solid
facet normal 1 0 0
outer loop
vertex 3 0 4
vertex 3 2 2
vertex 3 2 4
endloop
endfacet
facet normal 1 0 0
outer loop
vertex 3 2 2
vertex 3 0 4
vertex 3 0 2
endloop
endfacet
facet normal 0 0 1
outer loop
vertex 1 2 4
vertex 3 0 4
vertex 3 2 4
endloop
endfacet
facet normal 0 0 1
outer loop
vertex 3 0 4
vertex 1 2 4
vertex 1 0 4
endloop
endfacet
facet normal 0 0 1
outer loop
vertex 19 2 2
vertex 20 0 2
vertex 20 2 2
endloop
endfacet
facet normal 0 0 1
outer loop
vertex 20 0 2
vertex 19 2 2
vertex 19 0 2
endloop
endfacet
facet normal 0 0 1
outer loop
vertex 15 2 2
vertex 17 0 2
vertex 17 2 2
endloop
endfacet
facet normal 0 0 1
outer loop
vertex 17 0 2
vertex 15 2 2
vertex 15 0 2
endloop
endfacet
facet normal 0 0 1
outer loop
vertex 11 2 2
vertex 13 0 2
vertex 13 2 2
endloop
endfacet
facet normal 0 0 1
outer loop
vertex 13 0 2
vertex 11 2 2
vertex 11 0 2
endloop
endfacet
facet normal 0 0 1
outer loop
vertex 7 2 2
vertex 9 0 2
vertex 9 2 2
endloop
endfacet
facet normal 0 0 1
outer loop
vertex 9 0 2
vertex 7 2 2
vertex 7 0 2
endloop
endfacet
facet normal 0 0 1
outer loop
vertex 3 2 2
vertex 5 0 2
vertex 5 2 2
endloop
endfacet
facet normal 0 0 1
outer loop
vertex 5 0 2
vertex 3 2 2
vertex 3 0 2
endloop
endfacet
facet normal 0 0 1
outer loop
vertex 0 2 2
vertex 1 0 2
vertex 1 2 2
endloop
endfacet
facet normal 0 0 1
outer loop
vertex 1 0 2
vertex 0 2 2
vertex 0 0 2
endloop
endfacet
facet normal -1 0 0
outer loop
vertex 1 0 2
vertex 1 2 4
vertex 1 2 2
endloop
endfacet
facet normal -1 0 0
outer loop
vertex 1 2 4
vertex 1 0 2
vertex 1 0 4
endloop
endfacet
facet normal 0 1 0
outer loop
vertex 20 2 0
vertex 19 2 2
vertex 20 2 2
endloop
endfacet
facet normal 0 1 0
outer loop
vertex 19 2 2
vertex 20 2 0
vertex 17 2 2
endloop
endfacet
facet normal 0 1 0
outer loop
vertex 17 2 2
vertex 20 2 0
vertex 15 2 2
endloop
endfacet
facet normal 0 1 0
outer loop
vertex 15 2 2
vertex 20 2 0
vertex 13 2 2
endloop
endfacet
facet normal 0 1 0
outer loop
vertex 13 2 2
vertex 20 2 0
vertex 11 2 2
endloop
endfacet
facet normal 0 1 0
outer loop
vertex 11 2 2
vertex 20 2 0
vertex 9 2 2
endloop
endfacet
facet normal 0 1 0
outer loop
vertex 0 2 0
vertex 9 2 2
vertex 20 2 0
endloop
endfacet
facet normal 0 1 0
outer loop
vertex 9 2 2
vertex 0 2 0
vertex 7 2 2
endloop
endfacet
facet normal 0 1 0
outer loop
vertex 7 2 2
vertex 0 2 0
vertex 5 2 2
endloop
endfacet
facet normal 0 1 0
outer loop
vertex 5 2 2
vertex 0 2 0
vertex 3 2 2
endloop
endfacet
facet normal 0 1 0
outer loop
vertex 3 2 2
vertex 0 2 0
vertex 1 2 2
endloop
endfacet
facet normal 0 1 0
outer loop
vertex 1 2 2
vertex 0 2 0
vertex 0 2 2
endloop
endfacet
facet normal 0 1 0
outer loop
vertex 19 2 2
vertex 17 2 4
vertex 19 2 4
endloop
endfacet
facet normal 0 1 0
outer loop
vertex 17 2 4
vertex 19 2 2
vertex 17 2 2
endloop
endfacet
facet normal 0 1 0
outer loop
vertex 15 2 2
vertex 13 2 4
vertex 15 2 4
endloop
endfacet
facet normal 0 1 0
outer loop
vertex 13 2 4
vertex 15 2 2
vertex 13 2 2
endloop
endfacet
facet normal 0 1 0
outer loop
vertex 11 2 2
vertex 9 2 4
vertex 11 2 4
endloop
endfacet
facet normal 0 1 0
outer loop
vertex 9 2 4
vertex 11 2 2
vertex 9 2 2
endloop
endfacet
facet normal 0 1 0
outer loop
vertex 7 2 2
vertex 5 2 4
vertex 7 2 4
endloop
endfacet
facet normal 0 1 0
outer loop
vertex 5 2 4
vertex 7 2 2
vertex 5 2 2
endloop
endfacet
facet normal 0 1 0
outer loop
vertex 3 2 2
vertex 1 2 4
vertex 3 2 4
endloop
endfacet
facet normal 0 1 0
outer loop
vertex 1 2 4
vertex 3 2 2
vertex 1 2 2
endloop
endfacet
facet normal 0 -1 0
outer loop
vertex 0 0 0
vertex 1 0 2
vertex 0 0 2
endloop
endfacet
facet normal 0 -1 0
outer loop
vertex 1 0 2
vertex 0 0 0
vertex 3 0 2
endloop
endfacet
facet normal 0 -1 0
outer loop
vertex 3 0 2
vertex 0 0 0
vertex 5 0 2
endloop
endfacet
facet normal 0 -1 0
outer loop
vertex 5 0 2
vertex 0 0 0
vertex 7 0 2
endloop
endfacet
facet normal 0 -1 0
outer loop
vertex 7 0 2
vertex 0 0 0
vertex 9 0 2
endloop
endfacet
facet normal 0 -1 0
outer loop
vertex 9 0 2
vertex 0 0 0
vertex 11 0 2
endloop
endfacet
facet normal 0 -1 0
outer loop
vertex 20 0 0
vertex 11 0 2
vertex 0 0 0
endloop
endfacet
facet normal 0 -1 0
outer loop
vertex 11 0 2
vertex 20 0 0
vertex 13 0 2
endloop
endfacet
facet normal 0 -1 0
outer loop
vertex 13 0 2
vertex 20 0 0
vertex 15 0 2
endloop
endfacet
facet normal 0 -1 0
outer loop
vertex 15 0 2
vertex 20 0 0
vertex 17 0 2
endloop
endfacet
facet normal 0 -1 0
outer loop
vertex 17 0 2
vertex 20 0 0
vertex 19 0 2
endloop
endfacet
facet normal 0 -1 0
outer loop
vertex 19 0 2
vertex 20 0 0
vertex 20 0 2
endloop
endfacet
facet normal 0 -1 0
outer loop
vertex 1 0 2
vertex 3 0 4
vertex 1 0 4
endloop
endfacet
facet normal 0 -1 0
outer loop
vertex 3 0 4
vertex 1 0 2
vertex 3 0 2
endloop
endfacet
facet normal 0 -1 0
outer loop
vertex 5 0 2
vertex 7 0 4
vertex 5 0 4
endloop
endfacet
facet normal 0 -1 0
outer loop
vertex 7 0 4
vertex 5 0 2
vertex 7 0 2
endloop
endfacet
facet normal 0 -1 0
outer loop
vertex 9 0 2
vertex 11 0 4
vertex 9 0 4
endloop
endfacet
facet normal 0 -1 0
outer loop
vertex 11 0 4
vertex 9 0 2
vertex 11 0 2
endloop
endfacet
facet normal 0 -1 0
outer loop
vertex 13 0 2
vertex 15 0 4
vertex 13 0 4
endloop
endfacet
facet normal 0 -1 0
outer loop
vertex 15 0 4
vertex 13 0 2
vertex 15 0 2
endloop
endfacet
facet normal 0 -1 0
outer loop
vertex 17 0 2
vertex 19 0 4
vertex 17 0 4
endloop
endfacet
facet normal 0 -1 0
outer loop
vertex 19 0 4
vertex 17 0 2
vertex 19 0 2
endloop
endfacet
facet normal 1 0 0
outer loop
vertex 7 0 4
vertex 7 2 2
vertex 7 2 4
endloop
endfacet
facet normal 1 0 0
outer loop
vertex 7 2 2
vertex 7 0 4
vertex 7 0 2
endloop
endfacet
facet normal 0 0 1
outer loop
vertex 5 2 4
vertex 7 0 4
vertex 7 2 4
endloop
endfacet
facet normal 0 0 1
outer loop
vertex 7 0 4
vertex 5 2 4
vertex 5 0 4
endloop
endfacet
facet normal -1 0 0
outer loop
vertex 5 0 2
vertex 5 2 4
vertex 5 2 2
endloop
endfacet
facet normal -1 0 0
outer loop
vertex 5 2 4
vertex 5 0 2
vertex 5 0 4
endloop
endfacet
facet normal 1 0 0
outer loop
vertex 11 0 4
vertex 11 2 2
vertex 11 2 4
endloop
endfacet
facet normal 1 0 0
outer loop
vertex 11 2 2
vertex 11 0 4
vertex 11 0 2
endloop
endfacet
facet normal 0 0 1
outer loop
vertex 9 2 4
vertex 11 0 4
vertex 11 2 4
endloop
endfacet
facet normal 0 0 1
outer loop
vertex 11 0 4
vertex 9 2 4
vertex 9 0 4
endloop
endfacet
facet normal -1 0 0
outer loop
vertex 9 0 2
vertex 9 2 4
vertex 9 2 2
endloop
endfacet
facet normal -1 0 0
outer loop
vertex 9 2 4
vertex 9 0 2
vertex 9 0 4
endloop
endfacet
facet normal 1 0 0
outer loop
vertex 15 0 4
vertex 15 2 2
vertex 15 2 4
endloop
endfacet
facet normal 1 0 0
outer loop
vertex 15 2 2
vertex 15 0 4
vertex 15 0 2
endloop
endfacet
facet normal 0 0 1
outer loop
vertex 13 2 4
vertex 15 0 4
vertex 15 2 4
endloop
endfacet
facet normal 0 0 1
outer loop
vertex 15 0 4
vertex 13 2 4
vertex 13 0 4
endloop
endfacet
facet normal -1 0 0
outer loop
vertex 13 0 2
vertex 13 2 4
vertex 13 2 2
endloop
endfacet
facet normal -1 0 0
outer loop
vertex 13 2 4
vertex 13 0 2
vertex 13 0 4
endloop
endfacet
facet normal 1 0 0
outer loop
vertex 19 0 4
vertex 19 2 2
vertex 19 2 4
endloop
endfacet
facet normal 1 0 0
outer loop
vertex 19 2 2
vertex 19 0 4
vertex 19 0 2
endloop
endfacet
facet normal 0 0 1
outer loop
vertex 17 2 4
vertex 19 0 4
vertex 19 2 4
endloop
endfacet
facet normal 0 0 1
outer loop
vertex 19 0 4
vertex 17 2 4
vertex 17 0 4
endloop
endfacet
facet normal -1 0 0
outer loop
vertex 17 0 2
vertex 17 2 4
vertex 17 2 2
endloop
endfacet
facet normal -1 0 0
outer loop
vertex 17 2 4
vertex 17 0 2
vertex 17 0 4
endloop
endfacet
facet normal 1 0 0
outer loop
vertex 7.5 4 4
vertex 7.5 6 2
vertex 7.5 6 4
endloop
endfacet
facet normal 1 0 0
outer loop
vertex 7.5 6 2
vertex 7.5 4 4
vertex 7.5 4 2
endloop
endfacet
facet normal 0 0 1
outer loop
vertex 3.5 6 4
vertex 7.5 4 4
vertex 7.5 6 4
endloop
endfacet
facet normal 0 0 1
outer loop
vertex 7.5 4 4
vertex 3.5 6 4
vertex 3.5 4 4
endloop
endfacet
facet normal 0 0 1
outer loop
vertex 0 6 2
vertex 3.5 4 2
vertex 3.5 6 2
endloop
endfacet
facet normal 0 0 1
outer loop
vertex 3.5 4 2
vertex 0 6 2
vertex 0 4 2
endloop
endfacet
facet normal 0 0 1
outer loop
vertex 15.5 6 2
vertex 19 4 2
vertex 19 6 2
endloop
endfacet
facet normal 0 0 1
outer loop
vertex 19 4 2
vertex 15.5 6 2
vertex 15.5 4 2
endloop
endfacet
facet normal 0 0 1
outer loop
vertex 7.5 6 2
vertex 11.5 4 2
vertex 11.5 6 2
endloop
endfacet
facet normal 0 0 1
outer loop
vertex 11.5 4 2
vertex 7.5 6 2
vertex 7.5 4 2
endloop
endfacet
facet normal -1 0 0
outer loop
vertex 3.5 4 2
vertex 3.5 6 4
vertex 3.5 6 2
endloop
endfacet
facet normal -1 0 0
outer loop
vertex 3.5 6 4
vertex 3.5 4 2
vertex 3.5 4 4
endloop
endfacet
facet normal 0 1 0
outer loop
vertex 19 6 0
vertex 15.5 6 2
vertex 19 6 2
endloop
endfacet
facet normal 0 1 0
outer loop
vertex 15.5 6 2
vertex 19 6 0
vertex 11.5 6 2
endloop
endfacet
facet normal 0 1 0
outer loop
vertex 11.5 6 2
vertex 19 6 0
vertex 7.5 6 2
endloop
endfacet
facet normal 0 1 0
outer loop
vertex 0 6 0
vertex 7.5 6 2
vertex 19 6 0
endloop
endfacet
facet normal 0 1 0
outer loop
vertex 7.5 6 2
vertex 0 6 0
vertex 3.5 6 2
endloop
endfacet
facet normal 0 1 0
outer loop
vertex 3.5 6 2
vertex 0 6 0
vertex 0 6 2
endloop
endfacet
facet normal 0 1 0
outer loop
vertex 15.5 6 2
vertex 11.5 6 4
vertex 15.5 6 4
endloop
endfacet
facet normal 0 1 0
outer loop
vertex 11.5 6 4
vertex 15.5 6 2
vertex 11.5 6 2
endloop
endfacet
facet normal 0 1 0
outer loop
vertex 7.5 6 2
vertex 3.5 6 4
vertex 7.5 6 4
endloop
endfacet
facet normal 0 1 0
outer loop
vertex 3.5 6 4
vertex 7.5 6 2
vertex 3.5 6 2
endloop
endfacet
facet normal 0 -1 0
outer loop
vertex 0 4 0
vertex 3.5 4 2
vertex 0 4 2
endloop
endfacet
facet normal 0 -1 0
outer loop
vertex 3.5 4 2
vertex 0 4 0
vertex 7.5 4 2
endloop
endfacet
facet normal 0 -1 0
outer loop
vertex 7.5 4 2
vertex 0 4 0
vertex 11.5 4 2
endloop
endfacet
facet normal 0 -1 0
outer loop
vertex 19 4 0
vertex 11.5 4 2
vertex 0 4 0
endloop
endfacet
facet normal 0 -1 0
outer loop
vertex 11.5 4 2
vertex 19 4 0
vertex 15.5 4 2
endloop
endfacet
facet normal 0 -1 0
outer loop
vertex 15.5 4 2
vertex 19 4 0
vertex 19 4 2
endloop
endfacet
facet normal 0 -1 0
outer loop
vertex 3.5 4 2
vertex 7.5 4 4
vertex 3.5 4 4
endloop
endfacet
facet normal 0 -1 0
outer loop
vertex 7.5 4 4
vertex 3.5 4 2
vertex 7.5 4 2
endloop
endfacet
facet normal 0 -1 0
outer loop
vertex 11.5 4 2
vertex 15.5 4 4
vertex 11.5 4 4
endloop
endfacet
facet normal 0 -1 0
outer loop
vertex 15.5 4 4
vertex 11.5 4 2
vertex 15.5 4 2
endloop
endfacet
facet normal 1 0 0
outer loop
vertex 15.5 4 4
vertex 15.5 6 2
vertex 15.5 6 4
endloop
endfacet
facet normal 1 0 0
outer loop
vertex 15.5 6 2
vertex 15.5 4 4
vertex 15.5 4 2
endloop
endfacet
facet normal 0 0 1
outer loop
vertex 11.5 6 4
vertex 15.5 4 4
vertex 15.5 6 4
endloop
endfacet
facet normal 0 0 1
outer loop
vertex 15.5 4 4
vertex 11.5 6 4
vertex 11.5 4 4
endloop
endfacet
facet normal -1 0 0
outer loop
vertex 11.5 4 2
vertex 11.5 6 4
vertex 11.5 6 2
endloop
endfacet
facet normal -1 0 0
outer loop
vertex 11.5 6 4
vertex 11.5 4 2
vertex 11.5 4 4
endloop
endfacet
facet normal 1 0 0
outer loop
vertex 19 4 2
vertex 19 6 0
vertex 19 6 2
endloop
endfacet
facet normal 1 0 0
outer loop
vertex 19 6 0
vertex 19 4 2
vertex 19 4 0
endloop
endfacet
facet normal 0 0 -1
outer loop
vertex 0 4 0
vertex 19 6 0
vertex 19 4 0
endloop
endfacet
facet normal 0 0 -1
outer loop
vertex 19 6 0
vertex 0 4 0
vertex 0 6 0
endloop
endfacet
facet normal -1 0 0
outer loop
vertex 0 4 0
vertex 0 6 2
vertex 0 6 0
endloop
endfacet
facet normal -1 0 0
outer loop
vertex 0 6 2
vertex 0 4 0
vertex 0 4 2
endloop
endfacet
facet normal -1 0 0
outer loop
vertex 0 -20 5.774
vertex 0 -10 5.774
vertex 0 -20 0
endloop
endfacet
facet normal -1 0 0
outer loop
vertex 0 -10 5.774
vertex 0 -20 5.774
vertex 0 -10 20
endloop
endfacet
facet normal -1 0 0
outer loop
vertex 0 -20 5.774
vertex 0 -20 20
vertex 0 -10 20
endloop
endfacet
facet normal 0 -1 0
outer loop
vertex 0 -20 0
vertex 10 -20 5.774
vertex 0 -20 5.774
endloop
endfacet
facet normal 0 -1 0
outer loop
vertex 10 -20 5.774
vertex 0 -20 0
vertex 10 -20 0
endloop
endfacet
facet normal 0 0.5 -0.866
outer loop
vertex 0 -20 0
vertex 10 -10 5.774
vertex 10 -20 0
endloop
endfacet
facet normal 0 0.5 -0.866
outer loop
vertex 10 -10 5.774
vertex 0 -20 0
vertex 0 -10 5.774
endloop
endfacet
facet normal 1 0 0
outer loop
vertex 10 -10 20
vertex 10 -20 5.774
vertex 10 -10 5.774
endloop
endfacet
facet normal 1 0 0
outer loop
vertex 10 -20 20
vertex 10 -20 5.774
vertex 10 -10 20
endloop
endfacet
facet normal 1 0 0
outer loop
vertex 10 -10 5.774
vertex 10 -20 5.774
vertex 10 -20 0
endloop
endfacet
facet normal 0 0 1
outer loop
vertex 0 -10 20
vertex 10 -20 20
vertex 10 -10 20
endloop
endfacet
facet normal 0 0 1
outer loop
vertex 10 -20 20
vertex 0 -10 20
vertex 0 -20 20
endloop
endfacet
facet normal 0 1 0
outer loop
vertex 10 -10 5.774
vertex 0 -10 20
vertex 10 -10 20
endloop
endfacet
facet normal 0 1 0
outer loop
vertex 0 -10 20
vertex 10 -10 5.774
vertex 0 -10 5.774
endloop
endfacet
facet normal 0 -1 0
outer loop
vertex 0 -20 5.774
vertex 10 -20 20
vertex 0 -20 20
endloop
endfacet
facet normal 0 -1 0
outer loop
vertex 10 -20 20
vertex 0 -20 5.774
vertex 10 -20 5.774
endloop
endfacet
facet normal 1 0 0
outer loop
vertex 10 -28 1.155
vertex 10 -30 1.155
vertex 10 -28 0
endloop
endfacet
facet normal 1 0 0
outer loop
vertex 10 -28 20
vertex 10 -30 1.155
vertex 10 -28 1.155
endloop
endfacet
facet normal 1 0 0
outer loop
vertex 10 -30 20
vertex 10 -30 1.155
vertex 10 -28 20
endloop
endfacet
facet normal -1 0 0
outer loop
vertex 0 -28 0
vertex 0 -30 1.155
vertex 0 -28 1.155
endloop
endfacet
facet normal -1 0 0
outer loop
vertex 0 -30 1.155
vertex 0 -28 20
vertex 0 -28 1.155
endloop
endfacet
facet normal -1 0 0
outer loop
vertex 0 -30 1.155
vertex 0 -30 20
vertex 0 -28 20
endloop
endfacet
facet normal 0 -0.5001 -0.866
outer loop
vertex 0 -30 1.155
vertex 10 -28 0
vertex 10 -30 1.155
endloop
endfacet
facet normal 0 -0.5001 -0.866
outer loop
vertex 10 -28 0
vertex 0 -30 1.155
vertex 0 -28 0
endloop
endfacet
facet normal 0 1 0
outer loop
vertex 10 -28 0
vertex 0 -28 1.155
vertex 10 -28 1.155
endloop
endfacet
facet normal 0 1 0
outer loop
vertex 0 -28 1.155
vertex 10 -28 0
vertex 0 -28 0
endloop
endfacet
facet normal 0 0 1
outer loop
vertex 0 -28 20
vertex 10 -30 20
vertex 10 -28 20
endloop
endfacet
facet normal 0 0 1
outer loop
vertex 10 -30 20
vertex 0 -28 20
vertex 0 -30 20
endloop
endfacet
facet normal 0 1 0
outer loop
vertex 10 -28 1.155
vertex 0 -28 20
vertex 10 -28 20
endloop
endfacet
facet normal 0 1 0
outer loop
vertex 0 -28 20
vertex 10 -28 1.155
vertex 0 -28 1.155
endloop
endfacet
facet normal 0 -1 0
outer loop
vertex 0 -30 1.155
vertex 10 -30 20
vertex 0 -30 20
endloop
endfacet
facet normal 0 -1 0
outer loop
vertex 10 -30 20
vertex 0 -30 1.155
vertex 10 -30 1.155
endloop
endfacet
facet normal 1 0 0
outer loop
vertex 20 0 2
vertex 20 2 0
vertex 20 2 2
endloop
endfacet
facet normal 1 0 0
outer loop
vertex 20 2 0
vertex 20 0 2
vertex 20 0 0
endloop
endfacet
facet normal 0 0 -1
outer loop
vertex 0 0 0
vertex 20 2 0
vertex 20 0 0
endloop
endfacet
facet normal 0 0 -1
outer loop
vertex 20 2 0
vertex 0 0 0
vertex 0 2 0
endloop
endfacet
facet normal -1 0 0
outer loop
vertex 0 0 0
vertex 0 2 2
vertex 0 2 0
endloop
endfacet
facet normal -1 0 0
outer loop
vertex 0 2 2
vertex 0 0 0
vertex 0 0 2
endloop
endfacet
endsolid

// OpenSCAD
// file: utility.scad
/*This library, part of UtilitySCAD, is placed into the public domain by NMR_Scientist.

Version: R1
Title: UtilitySCAD
Description: Miscellaneous utility modules I developed over the course of several projects to reuse common operations that were seen over various models.

History:
* ??/??/2024 - R1 - First release to be with a model whenever it is released.
*/

$fa = 1;
$fs = 0.1;

use <MCAD/regular_shapes.scad>;

//Move objects in the x-axis.
module move_x (x)
{
    translate([x,0,0])
    {
        children();
    }
}

//Move objects in the y-axis
module move_y (y)
{
    translate([0,y,0])
    {
        children();
    }
}

//Move objects in the z-ax
module move_z (z)
{
    translate([0,0,z])
    {
        children();
    }
}

//Move objects by a given point in all direction. -1 would means moving to the left, moving back, and moving down by one point.
module move_by(point)
{
    translate([point,point,point])
    {
        children();
    }
}

//Exactly like move_by, but a negation. Named for its very common use in adding tolerance to objects.
module move_by_margin(m)
{
    move_by(-m)
    {
        children();
    }
}

//A cylinder rotated to its side.
module hor_cylinder(width,r,r)
{
    move_y(r)
        move_z(r)
            rotate([0,90,0])
            {
                cylinder(width,r,r);
            }
}

module hor_cylinder_y(length,r)
{
    translate([r * 2,0,0])
    {
        rotate([0,0,90])
        {
            hor_cylinder(length,r);
        }
    }
}


//Cut a object at a given height and then move that object down, usually to zero if the object was placed at zero height.
module hor_cut(width,length,height)
{
    translate([0,0,-height])
    {
        difference()
        {
            children();
            translate([-1,-1,-1])
            {
                cube([width + 2,length + 2,height + 1]);
            }
        }
    }
}

function bevel_radius(length) = length * 2 / 3;
function bevel_height(r) = r * sqrt(3)/2;

//Bevel at 45 degree slope up, facing back, then extrude upward by height.
module bevel_up_back_45(width,length,height)
{
    r = bevel_radius(length);
    z = bevel_height(r);
    m = 0.1;
    m_2 = m * 2;
    difference()
    {
        translate([0,r / 2,z])
        {
            rotate([0,90,0])
            {
                triangle_prism(width,r);
            }
        }
        // Cut off to the required height.
        move_x(-m)
            move_y(-m)
                move_z(height)
                   cube([width + m,length + m,z * 2 - height]);
    }
    //If cutting off isn't happening simply add height.
    if (height >= z)
    {
        move_z(z)
        {
            cube([width,length,height - z]);
        }
    }
}

module bevel_up_front_45(width,length,height)
{
    r = bevel_radius(length);
    z = bevel_height(r);
    m = 0.1;
    m_2 = m * 2;
    difference()
    {
        translate([width,r,z])
        {
            rotate([0,90,180])
            {
                triangle_prism(width,r);
            }
        }
        // Cut off to the required height.
        move_x(-m)
            move_y(-m)
                move_z(height)
                   cube([width + m,length + m,z * 2 - height]);
    }
    //If cutting off isn't happening simply add height.
    if (height >= z)
    {
        move_z(z)
        {
            cube([width,length,height - z]);
        }
    }
}

module center_z(centering_z,target_z)
{
    z = (target_z - centering_z) / 2;
    translate([0,0,z])
    {
        children();
    }
}

module center_y(centering_y,target_y)
{
    y = (target_y - centering_y) / 2;
    translate([0,y,0])
    {
        children();
    }
}

//Center an object against a particular width of another object.
module center(centering_w,target_w)
{
    x = (target_w - centering_w) / 2;
    translate([x,0,0])
    {
        children();
    }
}

//Move object to a certain value of x, but also account for the object size, such that the object is place before the point x. For a postive value of x, that is before the x, for a negative value of x, that is next to x. Useful for dimensional accurate placement.
module move_object_x(x,r)
{
    diameter = r * 2;
    if (abs(x) < diameter)
    {
        echo("Cannot move!");
    }
    else
    {
        if (x > 0)
        {
            move_x(x - diameter)
            {
                children();
            }
        }
        else if (x < 0)
        {
            move_x(x + diameter)
                children();
        }
    }
}


//Move object to a certain value of z, but also account for the object size, such that the object is place before the point z. For a postive value of z, that is below of z, for a negative value of z, that is above z. Useful for dimensional accurate placement.
module move_object_z(z, r)
{
    diameter = r * 2;
    if (abs(z) < diameter)
    {
        echo("Cannot move!");
    }
    else
    {
        if (z > 0)
        {
            move_z(z - diameter)
            {
                children();
            }
        }
        else if (z < 0)
        {
            move_z(z + diameter)
                children();
        }
    }
}


//Generaate all notches in a castellation at the same time, and space each notch for the length of the notch.
module notches(n, multipler)
{
    for (x = [1:n])
    {
        final_x = (x - 1) * multipler;
        move_x(final_x)
        {
            if ((x - 1) % 2 == 0)
            {
               children();
            }
        }
    }
}

//Get the total width of the Castellation, starting with the first and last notches.
function CastellateTotalW(w,size) = (w - 1) % 2 == 1 ? (w - 1) * size.x : w * size.x;


//Center the resulting castellation of a certain cuboid size.
module castellate(width,size, m = 0)
{
    total_notches = floor(width / size.x);
    total_w = CastellateTotalW(total_notches,size);
    center(total_w,width)
    {
        notches(total_notches,size.x)
        {
            move_x(m)
            {
                shrink = [size.x - (m * 2),size.y,size.z];
                cube(shrink);
            }
        }
    }

}
// main file
/* Public domain, for your own use. */
use <utility.scad>;

cube2 = [2,2,2];
d = 20;
cube([d,2,2]);
move_z(2)
{
    castellate(d,cube2);
}
move_y(4)
{
    cube3 = [4,2,2];
    d = 19;
    cube([d,2,2]);
    move_z(2)
    {
        castellate(d,cube3);
    }
}

translate([0,-20,0])
{
   bevel_up_back_45(10,10,20);
}

use <MCAD/regular_shapes.scad>;

translate([0,-30,0])
{
   bevel_up_front_45(10,2,20);
}
